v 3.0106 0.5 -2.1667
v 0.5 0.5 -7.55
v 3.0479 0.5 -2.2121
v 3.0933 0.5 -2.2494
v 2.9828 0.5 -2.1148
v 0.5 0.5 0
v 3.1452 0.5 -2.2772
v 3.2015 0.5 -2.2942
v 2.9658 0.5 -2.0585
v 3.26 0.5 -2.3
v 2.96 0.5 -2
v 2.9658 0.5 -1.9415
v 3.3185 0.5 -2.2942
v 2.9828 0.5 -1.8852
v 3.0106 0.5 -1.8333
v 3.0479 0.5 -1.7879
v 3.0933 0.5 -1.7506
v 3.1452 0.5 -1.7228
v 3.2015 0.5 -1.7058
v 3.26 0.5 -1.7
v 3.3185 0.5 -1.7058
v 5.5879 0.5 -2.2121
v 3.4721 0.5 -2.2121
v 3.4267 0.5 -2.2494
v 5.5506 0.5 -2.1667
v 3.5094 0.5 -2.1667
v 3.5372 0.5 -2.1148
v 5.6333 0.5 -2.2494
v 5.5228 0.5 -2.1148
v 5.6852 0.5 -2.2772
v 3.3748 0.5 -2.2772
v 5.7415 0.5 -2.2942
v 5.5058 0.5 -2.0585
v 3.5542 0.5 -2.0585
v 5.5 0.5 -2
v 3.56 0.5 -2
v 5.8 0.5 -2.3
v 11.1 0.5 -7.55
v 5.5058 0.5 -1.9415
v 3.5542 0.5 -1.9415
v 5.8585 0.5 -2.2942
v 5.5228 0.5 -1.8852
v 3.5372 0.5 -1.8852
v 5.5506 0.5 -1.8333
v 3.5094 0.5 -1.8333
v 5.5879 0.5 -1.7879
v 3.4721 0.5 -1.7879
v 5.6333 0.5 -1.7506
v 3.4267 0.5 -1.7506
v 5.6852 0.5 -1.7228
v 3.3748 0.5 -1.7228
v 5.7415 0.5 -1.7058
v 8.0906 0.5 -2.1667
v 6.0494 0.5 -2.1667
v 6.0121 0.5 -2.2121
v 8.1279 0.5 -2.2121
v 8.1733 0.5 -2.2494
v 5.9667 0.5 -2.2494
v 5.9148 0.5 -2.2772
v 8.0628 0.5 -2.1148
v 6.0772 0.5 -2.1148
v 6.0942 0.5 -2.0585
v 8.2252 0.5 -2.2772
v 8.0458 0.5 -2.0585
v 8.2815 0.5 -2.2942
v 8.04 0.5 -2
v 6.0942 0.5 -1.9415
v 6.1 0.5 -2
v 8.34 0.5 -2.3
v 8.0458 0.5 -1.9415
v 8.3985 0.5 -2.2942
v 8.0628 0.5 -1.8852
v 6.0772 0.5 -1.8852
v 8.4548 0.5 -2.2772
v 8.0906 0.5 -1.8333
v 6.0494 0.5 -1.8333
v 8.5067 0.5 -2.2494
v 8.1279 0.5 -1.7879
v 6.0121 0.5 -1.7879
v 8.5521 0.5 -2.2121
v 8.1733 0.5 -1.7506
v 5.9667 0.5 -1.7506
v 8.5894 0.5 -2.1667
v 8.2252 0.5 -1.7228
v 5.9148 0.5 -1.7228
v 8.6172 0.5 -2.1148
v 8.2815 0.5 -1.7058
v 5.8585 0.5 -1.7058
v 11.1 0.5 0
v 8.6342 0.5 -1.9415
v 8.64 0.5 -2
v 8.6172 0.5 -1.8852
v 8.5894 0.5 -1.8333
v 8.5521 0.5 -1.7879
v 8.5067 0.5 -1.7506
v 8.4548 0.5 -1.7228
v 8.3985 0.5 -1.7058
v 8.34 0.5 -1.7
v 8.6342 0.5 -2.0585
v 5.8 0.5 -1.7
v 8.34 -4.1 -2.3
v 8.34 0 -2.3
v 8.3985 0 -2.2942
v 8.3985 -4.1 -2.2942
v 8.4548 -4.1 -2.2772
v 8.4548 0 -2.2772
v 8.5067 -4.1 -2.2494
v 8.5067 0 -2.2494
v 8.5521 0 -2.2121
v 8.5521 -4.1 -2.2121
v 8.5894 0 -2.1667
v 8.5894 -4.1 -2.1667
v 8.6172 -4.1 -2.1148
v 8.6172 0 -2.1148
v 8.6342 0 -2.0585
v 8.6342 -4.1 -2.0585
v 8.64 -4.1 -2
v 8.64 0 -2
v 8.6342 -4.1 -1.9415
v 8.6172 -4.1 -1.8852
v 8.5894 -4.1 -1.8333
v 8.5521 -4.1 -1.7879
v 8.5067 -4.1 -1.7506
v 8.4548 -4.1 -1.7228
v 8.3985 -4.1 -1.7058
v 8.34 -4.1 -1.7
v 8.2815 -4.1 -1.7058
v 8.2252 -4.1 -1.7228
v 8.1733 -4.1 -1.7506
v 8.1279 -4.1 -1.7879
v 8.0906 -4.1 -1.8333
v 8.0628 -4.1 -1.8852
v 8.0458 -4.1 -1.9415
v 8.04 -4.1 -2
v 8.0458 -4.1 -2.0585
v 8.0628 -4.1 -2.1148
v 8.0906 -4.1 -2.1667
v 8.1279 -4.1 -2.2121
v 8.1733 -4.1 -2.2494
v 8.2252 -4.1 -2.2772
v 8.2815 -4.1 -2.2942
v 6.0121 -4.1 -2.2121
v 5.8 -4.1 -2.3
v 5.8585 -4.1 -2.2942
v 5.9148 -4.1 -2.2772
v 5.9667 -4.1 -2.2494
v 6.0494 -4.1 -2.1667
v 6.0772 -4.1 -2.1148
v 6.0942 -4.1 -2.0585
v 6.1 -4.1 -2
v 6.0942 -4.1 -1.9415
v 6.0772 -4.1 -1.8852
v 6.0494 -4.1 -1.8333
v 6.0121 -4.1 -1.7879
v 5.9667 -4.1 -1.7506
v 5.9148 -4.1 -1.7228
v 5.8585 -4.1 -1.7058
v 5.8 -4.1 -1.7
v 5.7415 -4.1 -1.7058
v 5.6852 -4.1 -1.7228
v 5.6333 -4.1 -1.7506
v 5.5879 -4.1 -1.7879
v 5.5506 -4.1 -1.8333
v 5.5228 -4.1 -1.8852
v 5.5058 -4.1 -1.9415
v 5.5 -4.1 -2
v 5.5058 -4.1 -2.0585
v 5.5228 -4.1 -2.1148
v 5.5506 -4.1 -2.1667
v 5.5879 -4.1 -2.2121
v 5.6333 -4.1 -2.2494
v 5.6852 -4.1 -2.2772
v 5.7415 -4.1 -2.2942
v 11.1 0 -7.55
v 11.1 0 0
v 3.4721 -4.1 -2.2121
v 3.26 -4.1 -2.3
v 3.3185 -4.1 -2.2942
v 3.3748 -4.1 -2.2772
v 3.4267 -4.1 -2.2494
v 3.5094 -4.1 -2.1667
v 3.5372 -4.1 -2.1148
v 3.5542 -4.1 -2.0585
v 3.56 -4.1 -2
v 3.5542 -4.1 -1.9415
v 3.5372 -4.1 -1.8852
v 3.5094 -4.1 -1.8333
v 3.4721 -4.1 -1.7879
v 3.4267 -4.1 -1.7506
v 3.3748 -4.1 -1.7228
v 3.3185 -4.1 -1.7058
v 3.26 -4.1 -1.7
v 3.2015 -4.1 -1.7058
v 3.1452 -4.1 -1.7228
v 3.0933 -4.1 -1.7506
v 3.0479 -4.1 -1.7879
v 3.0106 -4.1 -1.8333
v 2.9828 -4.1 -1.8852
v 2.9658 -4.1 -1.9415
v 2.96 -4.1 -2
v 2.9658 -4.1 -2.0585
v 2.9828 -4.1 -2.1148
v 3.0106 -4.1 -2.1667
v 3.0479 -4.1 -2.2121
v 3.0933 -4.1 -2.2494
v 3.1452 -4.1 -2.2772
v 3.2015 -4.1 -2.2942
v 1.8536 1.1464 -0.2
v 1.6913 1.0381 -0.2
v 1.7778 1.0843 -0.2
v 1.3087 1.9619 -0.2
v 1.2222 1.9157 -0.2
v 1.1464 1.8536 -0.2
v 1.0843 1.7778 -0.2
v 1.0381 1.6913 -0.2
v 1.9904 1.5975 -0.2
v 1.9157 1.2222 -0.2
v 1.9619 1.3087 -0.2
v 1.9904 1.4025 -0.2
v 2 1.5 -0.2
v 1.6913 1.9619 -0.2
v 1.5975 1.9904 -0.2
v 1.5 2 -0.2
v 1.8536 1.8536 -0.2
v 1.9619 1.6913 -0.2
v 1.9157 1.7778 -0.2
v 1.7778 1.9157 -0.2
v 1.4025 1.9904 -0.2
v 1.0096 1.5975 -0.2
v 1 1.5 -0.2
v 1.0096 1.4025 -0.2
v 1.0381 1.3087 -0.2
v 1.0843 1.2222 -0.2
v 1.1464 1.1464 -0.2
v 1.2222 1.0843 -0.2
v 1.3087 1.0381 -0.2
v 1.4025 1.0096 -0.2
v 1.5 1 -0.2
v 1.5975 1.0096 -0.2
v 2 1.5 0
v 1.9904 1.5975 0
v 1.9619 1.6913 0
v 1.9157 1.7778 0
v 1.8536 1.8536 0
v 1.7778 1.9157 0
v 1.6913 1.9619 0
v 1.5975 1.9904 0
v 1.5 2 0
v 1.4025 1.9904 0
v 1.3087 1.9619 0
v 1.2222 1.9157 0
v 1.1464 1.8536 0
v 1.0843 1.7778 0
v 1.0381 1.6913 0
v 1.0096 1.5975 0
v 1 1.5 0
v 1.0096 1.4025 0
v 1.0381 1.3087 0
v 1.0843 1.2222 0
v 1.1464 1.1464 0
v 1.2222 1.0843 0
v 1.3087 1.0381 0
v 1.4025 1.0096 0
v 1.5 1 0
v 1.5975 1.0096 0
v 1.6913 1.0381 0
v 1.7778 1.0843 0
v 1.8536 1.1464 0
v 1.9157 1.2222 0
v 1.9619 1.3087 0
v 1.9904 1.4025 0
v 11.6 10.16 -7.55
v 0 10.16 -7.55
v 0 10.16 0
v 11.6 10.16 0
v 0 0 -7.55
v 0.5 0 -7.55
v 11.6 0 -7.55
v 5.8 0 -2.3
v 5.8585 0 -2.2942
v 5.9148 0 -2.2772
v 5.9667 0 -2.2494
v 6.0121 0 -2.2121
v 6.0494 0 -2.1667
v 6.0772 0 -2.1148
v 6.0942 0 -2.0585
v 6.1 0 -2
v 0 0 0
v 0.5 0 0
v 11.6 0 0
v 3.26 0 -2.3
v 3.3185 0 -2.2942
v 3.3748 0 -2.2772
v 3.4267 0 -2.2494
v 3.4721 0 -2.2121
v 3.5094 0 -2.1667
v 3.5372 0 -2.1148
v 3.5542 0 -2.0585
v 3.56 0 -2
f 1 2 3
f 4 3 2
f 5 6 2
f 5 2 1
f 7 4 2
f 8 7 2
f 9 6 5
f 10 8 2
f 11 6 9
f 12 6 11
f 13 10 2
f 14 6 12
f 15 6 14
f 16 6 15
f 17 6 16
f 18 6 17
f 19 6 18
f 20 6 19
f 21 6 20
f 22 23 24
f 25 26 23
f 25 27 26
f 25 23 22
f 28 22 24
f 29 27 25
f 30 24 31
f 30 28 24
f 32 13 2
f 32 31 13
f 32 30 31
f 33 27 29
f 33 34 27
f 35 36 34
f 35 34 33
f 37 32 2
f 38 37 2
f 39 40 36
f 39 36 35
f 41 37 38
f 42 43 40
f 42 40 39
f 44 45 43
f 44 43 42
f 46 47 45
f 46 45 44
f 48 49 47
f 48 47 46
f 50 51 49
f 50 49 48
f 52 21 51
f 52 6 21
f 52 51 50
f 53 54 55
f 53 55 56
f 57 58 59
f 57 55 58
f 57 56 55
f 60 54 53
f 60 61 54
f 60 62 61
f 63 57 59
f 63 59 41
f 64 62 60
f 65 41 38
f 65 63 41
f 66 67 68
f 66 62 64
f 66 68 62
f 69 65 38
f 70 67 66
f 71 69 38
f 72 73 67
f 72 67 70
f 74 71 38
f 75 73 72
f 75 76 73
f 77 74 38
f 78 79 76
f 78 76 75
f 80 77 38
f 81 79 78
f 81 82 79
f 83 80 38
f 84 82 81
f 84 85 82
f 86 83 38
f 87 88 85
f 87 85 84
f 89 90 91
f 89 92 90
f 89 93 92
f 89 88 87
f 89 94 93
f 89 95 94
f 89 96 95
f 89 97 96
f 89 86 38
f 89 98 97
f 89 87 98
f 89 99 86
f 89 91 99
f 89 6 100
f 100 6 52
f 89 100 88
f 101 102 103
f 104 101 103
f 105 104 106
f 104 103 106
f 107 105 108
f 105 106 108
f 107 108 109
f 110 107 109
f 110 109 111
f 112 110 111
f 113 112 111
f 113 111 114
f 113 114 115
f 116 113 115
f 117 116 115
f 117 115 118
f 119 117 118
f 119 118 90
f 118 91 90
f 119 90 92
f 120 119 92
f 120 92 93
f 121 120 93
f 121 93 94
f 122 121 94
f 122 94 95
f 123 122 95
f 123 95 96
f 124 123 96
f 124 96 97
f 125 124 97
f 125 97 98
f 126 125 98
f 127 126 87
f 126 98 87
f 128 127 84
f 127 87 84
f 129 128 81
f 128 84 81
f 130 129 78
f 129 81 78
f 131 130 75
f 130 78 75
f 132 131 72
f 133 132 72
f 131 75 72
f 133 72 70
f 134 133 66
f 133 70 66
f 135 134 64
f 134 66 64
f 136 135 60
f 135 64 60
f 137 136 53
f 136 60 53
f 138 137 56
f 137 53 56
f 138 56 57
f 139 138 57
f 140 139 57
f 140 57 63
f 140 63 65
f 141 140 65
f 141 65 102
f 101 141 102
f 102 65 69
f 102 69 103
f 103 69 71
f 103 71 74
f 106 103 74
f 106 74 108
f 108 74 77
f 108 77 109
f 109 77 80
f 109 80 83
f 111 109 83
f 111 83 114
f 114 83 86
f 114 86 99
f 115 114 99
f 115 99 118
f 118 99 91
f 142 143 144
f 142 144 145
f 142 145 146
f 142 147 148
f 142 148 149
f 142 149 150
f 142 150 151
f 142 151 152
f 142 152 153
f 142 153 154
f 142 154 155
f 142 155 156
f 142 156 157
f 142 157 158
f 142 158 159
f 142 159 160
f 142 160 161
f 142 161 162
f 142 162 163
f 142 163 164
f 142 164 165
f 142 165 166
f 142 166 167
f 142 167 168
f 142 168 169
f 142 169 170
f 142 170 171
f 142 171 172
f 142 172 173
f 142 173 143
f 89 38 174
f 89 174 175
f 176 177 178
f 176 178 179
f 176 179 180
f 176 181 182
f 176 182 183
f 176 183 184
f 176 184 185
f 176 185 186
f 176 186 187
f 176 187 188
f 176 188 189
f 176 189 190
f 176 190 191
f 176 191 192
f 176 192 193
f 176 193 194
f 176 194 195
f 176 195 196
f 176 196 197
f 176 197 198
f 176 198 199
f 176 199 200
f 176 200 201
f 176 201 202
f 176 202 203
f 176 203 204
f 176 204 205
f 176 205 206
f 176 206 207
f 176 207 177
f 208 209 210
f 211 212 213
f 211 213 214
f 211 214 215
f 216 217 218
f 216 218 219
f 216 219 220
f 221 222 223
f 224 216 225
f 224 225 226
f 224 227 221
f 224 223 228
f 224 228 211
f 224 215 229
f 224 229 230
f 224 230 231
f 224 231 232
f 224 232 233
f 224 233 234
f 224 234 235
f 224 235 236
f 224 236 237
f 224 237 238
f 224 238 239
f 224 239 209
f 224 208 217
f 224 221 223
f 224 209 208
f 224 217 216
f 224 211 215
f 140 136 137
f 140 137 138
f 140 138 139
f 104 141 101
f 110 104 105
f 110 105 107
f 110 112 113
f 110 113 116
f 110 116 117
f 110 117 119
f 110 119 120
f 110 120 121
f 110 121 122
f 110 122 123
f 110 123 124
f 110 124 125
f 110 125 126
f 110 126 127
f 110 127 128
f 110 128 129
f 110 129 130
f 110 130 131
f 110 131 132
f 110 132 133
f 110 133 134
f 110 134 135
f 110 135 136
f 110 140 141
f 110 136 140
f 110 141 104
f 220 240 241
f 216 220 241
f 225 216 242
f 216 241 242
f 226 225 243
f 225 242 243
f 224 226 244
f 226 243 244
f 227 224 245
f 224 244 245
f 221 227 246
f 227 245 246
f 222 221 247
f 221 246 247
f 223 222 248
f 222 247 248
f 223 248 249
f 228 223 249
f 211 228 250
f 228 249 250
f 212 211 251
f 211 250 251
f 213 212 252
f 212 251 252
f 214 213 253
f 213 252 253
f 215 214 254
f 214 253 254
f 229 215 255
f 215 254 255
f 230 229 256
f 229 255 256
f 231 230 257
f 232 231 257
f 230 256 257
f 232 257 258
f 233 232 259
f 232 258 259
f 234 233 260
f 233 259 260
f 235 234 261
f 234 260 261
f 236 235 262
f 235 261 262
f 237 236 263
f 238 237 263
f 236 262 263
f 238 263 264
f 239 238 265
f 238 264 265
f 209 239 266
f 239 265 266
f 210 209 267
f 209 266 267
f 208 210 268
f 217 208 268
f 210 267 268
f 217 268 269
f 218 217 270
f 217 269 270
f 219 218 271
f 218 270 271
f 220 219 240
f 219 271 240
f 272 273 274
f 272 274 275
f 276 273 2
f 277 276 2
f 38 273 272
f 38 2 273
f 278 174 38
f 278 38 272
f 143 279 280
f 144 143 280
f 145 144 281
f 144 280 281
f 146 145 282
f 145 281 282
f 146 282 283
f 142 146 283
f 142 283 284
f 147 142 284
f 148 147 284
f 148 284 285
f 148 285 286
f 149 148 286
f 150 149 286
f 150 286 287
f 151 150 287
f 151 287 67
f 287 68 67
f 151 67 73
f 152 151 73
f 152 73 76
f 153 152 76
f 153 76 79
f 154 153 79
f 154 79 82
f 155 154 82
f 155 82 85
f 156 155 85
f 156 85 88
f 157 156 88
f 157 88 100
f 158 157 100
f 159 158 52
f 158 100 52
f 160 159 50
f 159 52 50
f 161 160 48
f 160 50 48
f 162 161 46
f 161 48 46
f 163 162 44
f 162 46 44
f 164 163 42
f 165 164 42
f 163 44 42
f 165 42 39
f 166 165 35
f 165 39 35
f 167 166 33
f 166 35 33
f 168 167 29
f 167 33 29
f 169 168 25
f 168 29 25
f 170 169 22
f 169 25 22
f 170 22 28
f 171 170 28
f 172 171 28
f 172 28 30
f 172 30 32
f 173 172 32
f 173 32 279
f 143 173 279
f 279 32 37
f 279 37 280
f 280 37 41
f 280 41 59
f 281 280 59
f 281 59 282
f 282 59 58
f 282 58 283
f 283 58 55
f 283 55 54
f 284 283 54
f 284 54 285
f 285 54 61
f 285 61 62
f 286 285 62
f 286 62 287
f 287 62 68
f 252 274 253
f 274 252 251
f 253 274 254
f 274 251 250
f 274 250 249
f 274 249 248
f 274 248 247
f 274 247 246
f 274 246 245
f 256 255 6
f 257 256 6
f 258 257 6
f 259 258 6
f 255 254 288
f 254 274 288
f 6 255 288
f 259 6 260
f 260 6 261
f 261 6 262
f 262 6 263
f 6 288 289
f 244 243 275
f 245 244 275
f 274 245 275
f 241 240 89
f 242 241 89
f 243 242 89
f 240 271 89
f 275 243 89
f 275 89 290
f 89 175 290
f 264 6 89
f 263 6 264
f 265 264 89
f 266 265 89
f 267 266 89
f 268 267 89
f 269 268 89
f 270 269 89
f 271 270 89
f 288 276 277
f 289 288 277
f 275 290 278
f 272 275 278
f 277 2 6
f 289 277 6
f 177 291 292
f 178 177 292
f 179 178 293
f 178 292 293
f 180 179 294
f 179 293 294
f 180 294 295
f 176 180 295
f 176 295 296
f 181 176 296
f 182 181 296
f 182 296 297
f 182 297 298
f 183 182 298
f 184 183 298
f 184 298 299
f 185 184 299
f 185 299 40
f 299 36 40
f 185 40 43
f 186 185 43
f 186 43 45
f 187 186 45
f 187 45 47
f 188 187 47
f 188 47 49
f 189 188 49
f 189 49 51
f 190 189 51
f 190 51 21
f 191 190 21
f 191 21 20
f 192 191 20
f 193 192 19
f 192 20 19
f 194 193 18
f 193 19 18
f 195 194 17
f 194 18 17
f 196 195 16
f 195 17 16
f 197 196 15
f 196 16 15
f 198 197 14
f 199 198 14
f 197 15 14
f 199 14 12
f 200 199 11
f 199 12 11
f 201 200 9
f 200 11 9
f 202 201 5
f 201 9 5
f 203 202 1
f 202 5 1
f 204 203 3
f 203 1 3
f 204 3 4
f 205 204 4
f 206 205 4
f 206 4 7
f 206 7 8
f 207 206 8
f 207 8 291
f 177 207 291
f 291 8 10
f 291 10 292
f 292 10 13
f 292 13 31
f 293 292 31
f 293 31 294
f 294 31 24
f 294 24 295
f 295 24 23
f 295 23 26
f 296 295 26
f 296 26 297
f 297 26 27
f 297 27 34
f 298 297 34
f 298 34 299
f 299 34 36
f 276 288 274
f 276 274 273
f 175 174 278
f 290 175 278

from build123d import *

# Parameters (mm, degrees)
SKETCH1_W                   = 11.6
SKETCH1_H                   = 7.55
BOSS_EXTRUDE1_DEPTH         = 10.16
SKETCH2_R                   = 0.5
CUT_EXTRUDE1_DEPTH          = 0.2
SKETCH3_R                   = 0.3
BOSS_EXTRUDE3_DEPTH         = 4.1
CUT_EXTRUDE_THIN1_START     = -0.5
CUT_EXTRUDE_THIN1_OUTLINE_W = 10.6
CUT_EXTRUDE_THIN1_OUTLINE_H = 7.55
CUT_EXTRUDE_THIN1_OUTLINE_R = 0.3
CUT_EXTRUDE_THIN1_DEPTH     = 0.5


# Read off the part's stored shape, not the designer's step: Cut-Extrude-Thin1
with BuildPart() as part:
    # Sketch1 → Boss-Extrude1 (new body)
    with BuildSketch(Plane(origin=(0, 0, 0), x_dir=(1, 0, 0), z_dir=(0, 1, 0))):
        with Locations((5.8, 3.775)):
            Rectangle(SKETCH1_W, SKETCH1_H)
    extrude(amount=BOSS_EXTRUDE1_DEPTH)

    # Sketch2 → Cut-Extrude1 (cut)
    with BuildSketch(Plane.XY):
        with Locations((1.5, 1.5)):
            Circle(SKETCH2_R)
    extrude(amount=-CUT_EXTRUDE1_DEPTH, mode=Mode.SUBTRACT)

    # Sketch3 → Boss-Extrude3 (add)
    with BuildSketch(Plane.XZ):
        with Locations(Location((5.8, -2, 0), (0, 0, 270))):
            Circle(SKETCH3_R)
        with Locations(Location((8.34, -2, 0), (0, 0, 270))):
            Circle(SKETCH3_R)
        with Locations(Location((3.26, -2, 0), (0, 0, 270))):
            Circle(SKETCH3_R)
    extrude(amount=BOSS_EXTRUDE3_DEPTH)

    # Cut-Extrude-Thin1 outline → Cut-Extrude-Thin1 (cut)
    with BuildSketch(Plane.XZ.offset(CUT_EXTRUDE_THIN1_START)):
        with Locations((5.8, -3.775)):
            Rectangle(CUT_EXTRUDE_THIN1_OUTLINE_W, CUT_EXTRUDE_THIN1_OUTLINE_H)
        with Locations((3.26, -2)):
            Circle(CUT_EXTRUDE_THIN1_OUTLINE_R, mode=Mode.SUBTRACT)
        with Locations((5.8, -2)):
            Circle(CUT_EXTRUDE_THIN1_OUTLINE_R, mode=Mode.SUBTRACT)
        with Locations((8.34, -2)):
            Circle(CUT_EXTRUDE_THIN1_OUTLINE_R, mode=Mode.SUBTRACT)
    extrude(amount=CUT_EXTRUDE_THIN1_DEPTH, mode=Mode.SUBTRACT)


solid = part.part
